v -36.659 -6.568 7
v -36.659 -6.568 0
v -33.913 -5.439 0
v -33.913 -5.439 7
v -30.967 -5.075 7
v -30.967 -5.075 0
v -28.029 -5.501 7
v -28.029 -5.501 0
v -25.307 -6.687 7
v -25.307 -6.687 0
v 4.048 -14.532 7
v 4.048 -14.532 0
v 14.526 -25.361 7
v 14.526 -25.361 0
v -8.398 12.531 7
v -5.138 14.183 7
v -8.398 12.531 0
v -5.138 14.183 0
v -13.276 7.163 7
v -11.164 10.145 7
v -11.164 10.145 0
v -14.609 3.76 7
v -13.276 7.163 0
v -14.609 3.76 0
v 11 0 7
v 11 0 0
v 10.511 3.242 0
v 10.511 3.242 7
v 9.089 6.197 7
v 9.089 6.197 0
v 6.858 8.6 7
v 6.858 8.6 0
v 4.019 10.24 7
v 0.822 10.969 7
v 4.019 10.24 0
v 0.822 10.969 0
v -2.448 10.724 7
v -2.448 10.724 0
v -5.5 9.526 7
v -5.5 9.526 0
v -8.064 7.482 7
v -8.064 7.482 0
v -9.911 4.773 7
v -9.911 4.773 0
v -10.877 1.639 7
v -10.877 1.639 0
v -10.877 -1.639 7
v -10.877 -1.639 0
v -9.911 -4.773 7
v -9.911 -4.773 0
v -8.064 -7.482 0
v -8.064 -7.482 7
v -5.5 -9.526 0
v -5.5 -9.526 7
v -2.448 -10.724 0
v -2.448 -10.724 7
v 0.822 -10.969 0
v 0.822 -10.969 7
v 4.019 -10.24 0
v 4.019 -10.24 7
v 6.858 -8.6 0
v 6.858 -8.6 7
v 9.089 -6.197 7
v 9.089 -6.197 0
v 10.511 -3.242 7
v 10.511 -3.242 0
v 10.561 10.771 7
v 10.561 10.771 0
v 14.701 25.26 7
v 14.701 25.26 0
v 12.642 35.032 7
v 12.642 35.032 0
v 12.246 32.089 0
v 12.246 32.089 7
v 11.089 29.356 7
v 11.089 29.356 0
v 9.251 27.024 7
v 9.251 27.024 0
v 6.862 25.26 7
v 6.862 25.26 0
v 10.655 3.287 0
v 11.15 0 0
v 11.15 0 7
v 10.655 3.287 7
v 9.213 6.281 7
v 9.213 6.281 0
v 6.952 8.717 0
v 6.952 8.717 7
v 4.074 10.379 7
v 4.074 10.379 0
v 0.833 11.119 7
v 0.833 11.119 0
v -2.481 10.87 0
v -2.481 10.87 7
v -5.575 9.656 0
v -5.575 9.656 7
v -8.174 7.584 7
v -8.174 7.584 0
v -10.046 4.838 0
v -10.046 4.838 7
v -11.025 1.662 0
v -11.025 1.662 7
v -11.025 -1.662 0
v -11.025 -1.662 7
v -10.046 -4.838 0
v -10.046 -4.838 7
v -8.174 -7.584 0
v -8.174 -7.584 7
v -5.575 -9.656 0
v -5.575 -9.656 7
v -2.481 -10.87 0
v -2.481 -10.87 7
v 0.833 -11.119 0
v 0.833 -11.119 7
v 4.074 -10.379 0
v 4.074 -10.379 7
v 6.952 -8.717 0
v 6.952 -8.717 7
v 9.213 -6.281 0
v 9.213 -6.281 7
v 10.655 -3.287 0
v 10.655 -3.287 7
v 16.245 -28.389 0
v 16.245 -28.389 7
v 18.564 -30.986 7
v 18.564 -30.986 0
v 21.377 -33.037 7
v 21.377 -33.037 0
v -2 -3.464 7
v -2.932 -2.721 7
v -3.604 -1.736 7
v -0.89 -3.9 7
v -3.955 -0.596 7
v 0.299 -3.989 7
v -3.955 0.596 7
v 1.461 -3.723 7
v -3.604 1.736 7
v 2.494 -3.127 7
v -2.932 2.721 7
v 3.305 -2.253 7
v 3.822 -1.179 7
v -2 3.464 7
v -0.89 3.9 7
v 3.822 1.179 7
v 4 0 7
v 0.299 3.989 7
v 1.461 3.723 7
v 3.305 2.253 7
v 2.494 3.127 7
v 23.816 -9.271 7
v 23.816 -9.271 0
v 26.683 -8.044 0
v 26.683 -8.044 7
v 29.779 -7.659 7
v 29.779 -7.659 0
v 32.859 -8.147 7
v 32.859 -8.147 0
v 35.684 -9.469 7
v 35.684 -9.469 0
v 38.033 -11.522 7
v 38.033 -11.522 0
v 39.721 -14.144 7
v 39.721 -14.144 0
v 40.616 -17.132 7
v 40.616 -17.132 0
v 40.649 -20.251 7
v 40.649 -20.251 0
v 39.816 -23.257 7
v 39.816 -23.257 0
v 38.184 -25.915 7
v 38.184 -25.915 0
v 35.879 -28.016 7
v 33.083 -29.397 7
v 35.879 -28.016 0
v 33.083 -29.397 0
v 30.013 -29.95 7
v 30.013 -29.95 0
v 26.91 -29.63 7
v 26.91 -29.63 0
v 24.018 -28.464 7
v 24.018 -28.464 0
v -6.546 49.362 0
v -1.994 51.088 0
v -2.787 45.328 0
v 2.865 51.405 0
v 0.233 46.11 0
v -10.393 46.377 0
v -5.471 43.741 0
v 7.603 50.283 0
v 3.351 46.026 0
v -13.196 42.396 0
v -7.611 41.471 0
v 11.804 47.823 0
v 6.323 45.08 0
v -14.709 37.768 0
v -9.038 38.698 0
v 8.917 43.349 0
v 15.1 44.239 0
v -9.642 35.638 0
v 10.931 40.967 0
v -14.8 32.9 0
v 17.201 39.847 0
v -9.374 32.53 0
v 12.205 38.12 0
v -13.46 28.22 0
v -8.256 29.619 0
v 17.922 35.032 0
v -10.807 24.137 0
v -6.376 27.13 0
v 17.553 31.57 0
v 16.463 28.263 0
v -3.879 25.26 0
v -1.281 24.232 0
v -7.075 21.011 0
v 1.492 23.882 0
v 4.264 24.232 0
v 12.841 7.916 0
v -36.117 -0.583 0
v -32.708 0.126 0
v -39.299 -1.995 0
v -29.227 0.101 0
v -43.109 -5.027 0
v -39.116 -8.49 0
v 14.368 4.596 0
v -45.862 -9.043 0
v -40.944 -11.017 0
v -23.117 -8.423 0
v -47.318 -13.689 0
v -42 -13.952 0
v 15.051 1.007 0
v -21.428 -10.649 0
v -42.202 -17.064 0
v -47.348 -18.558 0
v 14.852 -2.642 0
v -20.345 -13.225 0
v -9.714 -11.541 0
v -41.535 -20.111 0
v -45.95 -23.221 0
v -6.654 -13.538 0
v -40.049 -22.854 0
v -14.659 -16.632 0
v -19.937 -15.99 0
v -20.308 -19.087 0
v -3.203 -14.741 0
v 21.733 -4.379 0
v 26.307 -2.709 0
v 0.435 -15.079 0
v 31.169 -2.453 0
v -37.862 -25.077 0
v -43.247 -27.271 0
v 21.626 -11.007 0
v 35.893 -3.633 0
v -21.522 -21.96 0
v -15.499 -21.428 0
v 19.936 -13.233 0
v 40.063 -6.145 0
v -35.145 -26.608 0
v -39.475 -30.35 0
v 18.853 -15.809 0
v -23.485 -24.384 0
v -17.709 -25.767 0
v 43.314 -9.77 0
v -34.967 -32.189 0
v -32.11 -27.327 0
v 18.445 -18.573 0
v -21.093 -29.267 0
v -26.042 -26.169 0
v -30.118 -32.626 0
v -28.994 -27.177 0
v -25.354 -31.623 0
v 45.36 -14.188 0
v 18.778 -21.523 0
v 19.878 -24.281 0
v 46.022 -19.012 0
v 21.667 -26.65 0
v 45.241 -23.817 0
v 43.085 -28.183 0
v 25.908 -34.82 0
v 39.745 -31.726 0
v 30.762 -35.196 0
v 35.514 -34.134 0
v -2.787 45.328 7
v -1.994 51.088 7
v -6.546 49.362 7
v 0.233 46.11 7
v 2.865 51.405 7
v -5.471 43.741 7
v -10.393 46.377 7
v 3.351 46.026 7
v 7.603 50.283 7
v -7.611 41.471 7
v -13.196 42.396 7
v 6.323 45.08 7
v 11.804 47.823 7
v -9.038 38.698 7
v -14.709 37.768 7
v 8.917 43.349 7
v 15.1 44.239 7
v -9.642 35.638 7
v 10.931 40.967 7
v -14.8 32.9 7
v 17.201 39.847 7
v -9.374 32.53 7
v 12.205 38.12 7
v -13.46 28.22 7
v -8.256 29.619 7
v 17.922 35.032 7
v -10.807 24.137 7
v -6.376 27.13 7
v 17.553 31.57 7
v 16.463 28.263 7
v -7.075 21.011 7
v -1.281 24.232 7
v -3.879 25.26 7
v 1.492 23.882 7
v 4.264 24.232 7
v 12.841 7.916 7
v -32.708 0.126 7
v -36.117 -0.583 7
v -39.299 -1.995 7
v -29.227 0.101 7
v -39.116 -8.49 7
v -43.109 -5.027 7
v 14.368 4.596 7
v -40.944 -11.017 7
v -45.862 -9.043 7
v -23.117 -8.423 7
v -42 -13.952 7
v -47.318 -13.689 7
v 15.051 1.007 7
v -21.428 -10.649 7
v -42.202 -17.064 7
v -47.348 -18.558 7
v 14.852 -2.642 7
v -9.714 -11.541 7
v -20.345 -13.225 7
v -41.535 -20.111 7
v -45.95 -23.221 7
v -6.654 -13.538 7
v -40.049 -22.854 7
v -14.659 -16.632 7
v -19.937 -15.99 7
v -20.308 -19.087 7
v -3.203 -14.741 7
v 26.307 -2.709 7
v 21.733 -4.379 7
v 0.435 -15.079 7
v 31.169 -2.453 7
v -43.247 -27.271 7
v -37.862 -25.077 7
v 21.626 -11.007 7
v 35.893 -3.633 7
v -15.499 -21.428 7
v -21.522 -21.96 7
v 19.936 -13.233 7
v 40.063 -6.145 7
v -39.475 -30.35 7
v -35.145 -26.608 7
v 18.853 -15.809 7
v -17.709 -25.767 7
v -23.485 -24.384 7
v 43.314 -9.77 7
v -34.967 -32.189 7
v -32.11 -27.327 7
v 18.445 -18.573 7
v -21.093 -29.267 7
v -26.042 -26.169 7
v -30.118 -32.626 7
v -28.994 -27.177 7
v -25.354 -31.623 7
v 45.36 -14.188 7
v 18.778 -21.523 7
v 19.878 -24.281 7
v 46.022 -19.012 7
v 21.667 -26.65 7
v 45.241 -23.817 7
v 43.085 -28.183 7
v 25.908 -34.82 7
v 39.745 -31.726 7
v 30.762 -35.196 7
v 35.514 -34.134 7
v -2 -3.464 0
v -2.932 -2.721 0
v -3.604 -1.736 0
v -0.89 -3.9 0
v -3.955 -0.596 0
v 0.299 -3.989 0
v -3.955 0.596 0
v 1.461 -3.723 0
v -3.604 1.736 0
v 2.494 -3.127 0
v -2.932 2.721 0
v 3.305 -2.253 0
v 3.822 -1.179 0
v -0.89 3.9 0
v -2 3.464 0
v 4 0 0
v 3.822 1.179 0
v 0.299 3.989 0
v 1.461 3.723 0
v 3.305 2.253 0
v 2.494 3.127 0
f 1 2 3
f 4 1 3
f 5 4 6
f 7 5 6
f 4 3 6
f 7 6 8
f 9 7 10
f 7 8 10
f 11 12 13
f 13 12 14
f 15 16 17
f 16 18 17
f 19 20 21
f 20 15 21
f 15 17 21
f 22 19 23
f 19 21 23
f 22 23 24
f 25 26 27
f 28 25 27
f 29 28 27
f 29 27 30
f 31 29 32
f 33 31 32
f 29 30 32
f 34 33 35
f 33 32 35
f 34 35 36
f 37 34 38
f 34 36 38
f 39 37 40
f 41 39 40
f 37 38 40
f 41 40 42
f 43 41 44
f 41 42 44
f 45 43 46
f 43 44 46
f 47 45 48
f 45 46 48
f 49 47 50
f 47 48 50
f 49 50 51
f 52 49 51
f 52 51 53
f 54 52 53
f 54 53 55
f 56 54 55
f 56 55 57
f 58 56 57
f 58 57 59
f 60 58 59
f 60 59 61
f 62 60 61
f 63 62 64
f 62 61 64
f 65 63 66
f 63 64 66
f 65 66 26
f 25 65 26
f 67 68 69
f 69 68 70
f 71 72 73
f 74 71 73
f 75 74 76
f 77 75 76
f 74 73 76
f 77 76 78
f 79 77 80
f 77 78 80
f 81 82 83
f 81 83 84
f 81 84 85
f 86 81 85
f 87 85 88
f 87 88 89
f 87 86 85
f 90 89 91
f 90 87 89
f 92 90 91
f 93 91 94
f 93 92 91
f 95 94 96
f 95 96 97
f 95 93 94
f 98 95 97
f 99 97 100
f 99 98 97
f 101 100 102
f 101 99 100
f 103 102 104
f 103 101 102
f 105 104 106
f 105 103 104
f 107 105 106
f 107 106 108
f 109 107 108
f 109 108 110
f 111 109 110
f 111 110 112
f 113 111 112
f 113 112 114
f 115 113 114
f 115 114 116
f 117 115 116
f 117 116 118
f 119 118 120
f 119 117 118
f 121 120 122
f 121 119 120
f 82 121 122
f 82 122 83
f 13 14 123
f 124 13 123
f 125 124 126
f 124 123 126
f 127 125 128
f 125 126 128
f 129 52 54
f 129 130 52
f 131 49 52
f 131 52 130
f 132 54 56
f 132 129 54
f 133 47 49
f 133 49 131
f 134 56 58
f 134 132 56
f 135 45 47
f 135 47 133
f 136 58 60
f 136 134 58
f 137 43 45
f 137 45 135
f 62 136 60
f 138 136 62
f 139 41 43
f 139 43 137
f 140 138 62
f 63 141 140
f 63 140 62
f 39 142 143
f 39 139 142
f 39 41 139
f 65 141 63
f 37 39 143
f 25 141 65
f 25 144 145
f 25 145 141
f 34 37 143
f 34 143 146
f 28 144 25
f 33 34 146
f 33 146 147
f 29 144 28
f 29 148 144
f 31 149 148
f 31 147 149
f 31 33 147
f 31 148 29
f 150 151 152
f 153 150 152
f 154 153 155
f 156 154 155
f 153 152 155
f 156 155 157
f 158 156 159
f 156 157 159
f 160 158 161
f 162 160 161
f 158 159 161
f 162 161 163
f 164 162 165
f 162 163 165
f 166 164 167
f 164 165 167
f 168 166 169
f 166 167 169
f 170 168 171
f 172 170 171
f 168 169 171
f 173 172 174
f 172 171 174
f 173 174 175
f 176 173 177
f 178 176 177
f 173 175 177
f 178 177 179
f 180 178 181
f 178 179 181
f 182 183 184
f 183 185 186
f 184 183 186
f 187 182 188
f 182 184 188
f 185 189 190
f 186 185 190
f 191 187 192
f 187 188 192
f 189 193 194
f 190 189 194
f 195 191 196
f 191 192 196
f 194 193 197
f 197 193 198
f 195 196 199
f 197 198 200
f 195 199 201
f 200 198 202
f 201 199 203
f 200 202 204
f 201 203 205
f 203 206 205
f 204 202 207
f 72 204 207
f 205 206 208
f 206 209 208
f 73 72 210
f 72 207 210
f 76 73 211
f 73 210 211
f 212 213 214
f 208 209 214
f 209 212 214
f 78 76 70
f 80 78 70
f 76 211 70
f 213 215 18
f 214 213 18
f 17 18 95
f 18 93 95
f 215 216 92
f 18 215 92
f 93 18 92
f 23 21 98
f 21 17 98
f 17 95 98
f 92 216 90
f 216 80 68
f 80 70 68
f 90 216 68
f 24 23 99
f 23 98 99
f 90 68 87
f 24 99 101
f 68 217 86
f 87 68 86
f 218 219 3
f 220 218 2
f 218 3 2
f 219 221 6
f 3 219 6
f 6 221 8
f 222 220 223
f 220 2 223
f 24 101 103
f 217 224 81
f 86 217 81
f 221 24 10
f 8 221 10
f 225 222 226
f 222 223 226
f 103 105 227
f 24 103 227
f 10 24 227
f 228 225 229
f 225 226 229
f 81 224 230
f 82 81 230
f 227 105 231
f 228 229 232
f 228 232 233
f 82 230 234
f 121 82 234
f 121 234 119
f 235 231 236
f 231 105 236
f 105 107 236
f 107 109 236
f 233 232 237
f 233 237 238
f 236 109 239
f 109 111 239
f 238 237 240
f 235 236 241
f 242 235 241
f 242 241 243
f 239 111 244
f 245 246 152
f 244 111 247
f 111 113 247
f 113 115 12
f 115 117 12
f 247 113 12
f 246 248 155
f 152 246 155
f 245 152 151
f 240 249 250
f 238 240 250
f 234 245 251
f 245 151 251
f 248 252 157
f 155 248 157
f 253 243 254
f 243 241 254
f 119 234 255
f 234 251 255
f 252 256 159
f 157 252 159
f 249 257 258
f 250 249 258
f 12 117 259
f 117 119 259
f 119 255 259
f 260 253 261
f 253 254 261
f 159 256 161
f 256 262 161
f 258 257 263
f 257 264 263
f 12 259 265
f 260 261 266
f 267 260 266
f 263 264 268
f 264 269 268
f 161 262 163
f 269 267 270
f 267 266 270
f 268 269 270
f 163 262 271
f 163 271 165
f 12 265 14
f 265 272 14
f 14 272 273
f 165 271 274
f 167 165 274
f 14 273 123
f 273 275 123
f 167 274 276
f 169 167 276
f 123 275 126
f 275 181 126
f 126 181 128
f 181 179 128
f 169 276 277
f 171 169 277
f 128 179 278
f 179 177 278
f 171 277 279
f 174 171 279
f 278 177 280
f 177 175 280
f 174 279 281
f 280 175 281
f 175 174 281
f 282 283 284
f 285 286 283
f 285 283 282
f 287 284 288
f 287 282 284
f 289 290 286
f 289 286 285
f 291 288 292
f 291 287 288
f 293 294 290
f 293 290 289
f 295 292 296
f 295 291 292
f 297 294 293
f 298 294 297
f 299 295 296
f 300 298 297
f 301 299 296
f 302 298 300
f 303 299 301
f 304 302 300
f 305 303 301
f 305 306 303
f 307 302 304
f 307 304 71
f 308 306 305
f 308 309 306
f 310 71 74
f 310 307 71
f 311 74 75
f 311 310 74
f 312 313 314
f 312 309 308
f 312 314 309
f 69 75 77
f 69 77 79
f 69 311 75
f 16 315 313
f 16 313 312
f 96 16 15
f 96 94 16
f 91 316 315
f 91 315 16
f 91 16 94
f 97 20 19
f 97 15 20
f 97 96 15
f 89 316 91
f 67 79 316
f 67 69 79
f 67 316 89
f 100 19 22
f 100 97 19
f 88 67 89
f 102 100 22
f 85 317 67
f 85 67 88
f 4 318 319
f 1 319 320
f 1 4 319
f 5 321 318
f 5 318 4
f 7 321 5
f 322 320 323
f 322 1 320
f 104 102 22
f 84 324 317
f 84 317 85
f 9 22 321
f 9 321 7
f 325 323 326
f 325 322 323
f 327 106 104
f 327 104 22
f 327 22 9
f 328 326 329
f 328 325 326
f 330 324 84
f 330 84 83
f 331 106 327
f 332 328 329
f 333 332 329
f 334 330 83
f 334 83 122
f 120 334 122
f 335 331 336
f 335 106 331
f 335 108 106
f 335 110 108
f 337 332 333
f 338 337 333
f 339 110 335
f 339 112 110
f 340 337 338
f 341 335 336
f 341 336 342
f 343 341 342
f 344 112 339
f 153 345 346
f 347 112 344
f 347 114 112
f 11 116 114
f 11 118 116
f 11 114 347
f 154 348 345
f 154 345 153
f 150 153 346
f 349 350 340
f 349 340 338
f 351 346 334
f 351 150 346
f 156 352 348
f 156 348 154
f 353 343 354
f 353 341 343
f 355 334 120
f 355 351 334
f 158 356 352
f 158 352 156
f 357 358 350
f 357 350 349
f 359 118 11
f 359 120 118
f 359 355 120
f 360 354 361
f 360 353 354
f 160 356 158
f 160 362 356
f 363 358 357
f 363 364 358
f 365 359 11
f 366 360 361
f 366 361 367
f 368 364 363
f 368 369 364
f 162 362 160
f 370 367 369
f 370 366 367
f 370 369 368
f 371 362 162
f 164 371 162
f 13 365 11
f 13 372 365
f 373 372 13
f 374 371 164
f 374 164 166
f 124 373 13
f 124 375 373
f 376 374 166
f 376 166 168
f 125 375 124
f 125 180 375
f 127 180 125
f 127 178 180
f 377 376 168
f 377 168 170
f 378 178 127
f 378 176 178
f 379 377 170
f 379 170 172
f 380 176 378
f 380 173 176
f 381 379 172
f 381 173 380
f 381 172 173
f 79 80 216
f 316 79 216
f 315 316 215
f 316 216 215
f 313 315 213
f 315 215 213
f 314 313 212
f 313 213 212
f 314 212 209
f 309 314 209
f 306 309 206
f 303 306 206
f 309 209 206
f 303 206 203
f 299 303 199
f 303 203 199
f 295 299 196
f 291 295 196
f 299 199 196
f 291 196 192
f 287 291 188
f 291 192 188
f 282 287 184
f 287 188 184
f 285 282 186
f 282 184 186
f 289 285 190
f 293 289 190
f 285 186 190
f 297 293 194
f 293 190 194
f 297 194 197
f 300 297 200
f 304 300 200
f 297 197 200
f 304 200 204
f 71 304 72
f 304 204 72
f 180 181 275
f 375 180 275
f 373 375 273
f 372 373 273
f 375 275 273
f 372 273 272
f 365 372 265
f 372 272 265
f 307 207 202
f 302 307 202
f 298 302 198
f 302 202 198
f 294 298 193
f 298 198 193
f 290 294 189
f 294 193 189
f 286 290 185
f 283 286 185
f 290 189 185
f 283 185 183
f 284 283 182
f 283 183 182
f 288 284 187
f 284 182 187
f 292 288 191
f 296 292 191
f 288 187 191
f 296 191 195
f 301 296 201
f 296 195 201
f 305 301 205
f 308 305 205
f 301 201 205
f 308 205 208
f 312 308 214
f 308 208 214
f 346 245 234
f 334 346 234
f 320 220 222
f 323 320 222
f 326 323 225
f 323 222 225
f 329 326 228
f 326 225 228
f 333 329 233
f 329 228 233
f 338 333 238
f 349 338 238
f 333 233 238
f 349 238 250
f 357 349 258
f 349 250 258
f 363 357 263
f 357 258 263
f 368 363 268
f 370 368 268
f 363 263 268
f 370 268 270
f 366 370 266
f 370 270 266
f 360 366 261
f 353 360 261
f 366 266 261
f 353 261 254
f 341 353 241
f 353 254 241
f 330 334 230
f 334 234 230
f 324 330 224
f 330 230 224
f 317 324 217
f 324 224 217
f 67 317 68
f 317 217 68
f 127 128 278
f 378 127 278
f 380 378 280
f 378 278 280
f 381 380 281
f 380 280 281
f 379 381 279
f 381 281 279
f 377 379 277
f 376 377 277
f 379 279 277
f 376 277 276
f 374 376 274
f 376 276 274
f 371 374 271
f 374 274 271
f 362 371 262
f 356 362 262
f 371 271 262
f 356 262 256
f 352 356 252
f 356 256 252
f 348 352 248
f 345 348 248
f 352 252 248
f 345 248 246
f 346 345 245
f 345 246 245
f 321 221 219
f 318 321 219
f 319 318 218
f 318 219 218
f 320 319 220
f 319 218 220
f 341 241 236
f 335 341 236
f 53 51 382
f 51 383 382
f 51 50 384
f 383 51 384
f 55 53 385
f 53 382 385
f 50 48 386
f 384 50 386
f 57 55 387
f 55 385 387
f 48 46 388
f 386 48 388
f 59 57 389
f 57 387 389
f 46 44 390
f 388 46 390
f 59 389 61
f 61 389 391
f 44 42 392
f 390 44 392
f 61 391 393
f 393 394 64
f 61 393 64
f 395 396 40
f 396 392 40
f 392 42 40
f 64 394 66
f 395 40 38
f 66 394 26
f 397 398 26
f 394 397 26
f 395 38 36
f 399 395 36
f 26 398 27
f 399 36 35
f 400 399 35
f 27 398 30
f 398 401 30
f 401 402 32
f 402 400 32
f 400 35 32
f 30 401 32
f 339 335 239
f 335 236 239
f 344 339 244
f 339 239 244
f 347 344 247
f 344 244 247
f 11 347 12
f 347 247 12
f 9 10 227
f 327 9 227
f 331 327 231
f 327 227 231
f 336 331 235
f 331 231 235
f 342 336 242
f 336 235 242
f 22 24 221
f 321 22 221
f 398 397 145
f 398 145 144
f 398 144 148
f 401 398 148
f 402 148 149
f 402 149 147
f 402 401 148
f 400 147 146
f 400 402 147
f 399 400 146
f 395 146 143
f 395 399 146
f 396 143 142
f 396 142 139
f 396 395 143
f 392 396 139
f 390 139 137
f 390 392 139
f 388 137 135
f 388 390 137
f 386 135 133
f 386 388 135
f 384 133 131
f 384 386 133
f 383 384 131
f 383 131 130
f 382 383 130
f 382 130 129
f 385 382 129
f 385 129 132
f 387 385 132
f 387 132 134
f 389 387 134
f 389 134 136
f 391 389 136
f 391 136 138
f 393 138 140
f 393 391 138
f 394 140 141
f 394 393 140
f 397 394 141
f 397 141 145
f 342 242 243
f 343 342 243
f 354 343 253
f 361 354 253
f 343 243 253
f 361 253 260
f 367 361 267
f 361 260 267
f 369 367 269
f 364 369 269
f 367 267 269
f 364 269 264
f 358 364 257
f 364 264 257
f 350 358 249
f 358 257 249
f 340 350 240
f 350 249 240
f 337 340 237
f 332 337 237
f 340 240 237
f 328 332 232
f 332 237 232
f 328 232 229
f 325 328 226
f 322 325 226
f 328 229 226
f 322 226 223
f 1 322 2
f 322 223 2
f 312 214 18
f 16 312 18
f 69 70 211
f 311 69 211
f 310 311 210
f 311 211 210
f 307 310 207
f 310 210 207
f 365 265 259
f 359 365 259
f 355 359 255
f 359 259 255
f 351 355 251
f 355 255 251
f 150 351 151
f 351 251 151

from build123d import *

# Parameters (mm, degrees)
F0_R            = 11
F0_R_2          = 4
F1_DEPTH        = 7
F2_R            = 15.0849931144
F2_R_2          = 11.15
F3_DEPTH        = 7
F5_DEPTH        = 7
F5_COPIES_COUNT = 3


# Not quite as in the source:
# - a pattern or mirror of a feature is missing from the dataset's text; its kind, count and spacing are read off the source's solid


with BuildPart() as f1:
    # F0 (on Top) → F1 (new body)
    with BuildSketch(Plane.XY):
        Circle(F0_R)
        Circle(F0_R_2, mode=Mode.SUBTRACT)
    extrude(amount=F1_DEPTH)


with BuildPart() as f3:
    # F2 (on Top) → F3 (new body)
    with BuildSketch(Plane.XY):
        Circle(F2_R)
        Circle(F2_R_2, mode=Mode.SUBTRACT)
    extrude(amount=F3_DEPTH)

    # F4 (on Top) → F5 (join)
    with BuildSketch(Plane.XY):
        with BuildLine():
            Line((-7.0745577316, 21.0109236638), (-4.8416383778, 13.1369449955))
            Line((-4.8416383778, 13.1369449955), (6.196208957, 12.7750489976))
            Line((6.196208957, 12.7750489976), (9.9961235482, 8.7941850849))
            Line((9.9961235482, 8.7941850849), (14.7007794568, 25.2604825284))
            ThreePointArc((14.7007794568, 25.2604825284), (4.6386657732, 18.9054436461), (-7.0745577316, 21.0109236638))
        make_face()
        with BuildLine():
            ThreePointArc((17.9220181184, 35.0316912253), (-6.5463257275, 49.361823179), (-7.0745577316, 21.0109236638))
            Line((-7.0745577316, 21.0109236638), (-8.2796565302, 25.2604825284))
            Line((-8.2796565302, 25.2604825284), (-3.8792922685, 25.2604825284))
            ThreePointArc((-3.8792922685, 25.2604825284), (-4.184606348, 44.6287591763), (12.6415531586, 35.0316912253))
            ThreePointArc((12.6415531586, 35.0316912253), (11.0886211095, 29.3555317188), (6.8623985856, 25.2604825284))
            Line((6.8623985856, 25.2604825284), (14.7007794568, 25.2604825284))
            ThreePointArc((14.7007794568, 25.2604825284), (17.0959421027, 29.8874493494), (17.9220181184, 35.0316912253))
        make_face()
        with BuildLine():
            Line((-8.2796565302, 25.2604825284), (-7.0745577316, 21.0109236638))
            ThreePointArc((-7.0745577316, 21.0109236638), (4.6386657732, 18.9054436461), (14.7007794568, 25.2604825284))
            Line((14.7007794568, 25.2604825284), (6.8623985856, 25.2604825284))
            ThreePointArc((6.8623985856, 25.2604825284), (1.4915531586, 23.8816912253), (-3.8792922685, 25.2604825284))
            Line((-3.8792922685, 25.2604825284), (-8.2796565302, 25.2604825284))
        make_face()
    f5 = extrude(amount=F5_DEPTH)

    # F5_copies: F5 ×3 about axis
    f5_copies_axis = Axis((0, 0, 0), (0, 0, 1))
    for i in range(1, F5_COPIES_COUNT):
        add(f5.rotate(f5_copies_axis, i * 360 / F5_COPIES_COUNT))


solid = Compound([f1.part, f3.part])
